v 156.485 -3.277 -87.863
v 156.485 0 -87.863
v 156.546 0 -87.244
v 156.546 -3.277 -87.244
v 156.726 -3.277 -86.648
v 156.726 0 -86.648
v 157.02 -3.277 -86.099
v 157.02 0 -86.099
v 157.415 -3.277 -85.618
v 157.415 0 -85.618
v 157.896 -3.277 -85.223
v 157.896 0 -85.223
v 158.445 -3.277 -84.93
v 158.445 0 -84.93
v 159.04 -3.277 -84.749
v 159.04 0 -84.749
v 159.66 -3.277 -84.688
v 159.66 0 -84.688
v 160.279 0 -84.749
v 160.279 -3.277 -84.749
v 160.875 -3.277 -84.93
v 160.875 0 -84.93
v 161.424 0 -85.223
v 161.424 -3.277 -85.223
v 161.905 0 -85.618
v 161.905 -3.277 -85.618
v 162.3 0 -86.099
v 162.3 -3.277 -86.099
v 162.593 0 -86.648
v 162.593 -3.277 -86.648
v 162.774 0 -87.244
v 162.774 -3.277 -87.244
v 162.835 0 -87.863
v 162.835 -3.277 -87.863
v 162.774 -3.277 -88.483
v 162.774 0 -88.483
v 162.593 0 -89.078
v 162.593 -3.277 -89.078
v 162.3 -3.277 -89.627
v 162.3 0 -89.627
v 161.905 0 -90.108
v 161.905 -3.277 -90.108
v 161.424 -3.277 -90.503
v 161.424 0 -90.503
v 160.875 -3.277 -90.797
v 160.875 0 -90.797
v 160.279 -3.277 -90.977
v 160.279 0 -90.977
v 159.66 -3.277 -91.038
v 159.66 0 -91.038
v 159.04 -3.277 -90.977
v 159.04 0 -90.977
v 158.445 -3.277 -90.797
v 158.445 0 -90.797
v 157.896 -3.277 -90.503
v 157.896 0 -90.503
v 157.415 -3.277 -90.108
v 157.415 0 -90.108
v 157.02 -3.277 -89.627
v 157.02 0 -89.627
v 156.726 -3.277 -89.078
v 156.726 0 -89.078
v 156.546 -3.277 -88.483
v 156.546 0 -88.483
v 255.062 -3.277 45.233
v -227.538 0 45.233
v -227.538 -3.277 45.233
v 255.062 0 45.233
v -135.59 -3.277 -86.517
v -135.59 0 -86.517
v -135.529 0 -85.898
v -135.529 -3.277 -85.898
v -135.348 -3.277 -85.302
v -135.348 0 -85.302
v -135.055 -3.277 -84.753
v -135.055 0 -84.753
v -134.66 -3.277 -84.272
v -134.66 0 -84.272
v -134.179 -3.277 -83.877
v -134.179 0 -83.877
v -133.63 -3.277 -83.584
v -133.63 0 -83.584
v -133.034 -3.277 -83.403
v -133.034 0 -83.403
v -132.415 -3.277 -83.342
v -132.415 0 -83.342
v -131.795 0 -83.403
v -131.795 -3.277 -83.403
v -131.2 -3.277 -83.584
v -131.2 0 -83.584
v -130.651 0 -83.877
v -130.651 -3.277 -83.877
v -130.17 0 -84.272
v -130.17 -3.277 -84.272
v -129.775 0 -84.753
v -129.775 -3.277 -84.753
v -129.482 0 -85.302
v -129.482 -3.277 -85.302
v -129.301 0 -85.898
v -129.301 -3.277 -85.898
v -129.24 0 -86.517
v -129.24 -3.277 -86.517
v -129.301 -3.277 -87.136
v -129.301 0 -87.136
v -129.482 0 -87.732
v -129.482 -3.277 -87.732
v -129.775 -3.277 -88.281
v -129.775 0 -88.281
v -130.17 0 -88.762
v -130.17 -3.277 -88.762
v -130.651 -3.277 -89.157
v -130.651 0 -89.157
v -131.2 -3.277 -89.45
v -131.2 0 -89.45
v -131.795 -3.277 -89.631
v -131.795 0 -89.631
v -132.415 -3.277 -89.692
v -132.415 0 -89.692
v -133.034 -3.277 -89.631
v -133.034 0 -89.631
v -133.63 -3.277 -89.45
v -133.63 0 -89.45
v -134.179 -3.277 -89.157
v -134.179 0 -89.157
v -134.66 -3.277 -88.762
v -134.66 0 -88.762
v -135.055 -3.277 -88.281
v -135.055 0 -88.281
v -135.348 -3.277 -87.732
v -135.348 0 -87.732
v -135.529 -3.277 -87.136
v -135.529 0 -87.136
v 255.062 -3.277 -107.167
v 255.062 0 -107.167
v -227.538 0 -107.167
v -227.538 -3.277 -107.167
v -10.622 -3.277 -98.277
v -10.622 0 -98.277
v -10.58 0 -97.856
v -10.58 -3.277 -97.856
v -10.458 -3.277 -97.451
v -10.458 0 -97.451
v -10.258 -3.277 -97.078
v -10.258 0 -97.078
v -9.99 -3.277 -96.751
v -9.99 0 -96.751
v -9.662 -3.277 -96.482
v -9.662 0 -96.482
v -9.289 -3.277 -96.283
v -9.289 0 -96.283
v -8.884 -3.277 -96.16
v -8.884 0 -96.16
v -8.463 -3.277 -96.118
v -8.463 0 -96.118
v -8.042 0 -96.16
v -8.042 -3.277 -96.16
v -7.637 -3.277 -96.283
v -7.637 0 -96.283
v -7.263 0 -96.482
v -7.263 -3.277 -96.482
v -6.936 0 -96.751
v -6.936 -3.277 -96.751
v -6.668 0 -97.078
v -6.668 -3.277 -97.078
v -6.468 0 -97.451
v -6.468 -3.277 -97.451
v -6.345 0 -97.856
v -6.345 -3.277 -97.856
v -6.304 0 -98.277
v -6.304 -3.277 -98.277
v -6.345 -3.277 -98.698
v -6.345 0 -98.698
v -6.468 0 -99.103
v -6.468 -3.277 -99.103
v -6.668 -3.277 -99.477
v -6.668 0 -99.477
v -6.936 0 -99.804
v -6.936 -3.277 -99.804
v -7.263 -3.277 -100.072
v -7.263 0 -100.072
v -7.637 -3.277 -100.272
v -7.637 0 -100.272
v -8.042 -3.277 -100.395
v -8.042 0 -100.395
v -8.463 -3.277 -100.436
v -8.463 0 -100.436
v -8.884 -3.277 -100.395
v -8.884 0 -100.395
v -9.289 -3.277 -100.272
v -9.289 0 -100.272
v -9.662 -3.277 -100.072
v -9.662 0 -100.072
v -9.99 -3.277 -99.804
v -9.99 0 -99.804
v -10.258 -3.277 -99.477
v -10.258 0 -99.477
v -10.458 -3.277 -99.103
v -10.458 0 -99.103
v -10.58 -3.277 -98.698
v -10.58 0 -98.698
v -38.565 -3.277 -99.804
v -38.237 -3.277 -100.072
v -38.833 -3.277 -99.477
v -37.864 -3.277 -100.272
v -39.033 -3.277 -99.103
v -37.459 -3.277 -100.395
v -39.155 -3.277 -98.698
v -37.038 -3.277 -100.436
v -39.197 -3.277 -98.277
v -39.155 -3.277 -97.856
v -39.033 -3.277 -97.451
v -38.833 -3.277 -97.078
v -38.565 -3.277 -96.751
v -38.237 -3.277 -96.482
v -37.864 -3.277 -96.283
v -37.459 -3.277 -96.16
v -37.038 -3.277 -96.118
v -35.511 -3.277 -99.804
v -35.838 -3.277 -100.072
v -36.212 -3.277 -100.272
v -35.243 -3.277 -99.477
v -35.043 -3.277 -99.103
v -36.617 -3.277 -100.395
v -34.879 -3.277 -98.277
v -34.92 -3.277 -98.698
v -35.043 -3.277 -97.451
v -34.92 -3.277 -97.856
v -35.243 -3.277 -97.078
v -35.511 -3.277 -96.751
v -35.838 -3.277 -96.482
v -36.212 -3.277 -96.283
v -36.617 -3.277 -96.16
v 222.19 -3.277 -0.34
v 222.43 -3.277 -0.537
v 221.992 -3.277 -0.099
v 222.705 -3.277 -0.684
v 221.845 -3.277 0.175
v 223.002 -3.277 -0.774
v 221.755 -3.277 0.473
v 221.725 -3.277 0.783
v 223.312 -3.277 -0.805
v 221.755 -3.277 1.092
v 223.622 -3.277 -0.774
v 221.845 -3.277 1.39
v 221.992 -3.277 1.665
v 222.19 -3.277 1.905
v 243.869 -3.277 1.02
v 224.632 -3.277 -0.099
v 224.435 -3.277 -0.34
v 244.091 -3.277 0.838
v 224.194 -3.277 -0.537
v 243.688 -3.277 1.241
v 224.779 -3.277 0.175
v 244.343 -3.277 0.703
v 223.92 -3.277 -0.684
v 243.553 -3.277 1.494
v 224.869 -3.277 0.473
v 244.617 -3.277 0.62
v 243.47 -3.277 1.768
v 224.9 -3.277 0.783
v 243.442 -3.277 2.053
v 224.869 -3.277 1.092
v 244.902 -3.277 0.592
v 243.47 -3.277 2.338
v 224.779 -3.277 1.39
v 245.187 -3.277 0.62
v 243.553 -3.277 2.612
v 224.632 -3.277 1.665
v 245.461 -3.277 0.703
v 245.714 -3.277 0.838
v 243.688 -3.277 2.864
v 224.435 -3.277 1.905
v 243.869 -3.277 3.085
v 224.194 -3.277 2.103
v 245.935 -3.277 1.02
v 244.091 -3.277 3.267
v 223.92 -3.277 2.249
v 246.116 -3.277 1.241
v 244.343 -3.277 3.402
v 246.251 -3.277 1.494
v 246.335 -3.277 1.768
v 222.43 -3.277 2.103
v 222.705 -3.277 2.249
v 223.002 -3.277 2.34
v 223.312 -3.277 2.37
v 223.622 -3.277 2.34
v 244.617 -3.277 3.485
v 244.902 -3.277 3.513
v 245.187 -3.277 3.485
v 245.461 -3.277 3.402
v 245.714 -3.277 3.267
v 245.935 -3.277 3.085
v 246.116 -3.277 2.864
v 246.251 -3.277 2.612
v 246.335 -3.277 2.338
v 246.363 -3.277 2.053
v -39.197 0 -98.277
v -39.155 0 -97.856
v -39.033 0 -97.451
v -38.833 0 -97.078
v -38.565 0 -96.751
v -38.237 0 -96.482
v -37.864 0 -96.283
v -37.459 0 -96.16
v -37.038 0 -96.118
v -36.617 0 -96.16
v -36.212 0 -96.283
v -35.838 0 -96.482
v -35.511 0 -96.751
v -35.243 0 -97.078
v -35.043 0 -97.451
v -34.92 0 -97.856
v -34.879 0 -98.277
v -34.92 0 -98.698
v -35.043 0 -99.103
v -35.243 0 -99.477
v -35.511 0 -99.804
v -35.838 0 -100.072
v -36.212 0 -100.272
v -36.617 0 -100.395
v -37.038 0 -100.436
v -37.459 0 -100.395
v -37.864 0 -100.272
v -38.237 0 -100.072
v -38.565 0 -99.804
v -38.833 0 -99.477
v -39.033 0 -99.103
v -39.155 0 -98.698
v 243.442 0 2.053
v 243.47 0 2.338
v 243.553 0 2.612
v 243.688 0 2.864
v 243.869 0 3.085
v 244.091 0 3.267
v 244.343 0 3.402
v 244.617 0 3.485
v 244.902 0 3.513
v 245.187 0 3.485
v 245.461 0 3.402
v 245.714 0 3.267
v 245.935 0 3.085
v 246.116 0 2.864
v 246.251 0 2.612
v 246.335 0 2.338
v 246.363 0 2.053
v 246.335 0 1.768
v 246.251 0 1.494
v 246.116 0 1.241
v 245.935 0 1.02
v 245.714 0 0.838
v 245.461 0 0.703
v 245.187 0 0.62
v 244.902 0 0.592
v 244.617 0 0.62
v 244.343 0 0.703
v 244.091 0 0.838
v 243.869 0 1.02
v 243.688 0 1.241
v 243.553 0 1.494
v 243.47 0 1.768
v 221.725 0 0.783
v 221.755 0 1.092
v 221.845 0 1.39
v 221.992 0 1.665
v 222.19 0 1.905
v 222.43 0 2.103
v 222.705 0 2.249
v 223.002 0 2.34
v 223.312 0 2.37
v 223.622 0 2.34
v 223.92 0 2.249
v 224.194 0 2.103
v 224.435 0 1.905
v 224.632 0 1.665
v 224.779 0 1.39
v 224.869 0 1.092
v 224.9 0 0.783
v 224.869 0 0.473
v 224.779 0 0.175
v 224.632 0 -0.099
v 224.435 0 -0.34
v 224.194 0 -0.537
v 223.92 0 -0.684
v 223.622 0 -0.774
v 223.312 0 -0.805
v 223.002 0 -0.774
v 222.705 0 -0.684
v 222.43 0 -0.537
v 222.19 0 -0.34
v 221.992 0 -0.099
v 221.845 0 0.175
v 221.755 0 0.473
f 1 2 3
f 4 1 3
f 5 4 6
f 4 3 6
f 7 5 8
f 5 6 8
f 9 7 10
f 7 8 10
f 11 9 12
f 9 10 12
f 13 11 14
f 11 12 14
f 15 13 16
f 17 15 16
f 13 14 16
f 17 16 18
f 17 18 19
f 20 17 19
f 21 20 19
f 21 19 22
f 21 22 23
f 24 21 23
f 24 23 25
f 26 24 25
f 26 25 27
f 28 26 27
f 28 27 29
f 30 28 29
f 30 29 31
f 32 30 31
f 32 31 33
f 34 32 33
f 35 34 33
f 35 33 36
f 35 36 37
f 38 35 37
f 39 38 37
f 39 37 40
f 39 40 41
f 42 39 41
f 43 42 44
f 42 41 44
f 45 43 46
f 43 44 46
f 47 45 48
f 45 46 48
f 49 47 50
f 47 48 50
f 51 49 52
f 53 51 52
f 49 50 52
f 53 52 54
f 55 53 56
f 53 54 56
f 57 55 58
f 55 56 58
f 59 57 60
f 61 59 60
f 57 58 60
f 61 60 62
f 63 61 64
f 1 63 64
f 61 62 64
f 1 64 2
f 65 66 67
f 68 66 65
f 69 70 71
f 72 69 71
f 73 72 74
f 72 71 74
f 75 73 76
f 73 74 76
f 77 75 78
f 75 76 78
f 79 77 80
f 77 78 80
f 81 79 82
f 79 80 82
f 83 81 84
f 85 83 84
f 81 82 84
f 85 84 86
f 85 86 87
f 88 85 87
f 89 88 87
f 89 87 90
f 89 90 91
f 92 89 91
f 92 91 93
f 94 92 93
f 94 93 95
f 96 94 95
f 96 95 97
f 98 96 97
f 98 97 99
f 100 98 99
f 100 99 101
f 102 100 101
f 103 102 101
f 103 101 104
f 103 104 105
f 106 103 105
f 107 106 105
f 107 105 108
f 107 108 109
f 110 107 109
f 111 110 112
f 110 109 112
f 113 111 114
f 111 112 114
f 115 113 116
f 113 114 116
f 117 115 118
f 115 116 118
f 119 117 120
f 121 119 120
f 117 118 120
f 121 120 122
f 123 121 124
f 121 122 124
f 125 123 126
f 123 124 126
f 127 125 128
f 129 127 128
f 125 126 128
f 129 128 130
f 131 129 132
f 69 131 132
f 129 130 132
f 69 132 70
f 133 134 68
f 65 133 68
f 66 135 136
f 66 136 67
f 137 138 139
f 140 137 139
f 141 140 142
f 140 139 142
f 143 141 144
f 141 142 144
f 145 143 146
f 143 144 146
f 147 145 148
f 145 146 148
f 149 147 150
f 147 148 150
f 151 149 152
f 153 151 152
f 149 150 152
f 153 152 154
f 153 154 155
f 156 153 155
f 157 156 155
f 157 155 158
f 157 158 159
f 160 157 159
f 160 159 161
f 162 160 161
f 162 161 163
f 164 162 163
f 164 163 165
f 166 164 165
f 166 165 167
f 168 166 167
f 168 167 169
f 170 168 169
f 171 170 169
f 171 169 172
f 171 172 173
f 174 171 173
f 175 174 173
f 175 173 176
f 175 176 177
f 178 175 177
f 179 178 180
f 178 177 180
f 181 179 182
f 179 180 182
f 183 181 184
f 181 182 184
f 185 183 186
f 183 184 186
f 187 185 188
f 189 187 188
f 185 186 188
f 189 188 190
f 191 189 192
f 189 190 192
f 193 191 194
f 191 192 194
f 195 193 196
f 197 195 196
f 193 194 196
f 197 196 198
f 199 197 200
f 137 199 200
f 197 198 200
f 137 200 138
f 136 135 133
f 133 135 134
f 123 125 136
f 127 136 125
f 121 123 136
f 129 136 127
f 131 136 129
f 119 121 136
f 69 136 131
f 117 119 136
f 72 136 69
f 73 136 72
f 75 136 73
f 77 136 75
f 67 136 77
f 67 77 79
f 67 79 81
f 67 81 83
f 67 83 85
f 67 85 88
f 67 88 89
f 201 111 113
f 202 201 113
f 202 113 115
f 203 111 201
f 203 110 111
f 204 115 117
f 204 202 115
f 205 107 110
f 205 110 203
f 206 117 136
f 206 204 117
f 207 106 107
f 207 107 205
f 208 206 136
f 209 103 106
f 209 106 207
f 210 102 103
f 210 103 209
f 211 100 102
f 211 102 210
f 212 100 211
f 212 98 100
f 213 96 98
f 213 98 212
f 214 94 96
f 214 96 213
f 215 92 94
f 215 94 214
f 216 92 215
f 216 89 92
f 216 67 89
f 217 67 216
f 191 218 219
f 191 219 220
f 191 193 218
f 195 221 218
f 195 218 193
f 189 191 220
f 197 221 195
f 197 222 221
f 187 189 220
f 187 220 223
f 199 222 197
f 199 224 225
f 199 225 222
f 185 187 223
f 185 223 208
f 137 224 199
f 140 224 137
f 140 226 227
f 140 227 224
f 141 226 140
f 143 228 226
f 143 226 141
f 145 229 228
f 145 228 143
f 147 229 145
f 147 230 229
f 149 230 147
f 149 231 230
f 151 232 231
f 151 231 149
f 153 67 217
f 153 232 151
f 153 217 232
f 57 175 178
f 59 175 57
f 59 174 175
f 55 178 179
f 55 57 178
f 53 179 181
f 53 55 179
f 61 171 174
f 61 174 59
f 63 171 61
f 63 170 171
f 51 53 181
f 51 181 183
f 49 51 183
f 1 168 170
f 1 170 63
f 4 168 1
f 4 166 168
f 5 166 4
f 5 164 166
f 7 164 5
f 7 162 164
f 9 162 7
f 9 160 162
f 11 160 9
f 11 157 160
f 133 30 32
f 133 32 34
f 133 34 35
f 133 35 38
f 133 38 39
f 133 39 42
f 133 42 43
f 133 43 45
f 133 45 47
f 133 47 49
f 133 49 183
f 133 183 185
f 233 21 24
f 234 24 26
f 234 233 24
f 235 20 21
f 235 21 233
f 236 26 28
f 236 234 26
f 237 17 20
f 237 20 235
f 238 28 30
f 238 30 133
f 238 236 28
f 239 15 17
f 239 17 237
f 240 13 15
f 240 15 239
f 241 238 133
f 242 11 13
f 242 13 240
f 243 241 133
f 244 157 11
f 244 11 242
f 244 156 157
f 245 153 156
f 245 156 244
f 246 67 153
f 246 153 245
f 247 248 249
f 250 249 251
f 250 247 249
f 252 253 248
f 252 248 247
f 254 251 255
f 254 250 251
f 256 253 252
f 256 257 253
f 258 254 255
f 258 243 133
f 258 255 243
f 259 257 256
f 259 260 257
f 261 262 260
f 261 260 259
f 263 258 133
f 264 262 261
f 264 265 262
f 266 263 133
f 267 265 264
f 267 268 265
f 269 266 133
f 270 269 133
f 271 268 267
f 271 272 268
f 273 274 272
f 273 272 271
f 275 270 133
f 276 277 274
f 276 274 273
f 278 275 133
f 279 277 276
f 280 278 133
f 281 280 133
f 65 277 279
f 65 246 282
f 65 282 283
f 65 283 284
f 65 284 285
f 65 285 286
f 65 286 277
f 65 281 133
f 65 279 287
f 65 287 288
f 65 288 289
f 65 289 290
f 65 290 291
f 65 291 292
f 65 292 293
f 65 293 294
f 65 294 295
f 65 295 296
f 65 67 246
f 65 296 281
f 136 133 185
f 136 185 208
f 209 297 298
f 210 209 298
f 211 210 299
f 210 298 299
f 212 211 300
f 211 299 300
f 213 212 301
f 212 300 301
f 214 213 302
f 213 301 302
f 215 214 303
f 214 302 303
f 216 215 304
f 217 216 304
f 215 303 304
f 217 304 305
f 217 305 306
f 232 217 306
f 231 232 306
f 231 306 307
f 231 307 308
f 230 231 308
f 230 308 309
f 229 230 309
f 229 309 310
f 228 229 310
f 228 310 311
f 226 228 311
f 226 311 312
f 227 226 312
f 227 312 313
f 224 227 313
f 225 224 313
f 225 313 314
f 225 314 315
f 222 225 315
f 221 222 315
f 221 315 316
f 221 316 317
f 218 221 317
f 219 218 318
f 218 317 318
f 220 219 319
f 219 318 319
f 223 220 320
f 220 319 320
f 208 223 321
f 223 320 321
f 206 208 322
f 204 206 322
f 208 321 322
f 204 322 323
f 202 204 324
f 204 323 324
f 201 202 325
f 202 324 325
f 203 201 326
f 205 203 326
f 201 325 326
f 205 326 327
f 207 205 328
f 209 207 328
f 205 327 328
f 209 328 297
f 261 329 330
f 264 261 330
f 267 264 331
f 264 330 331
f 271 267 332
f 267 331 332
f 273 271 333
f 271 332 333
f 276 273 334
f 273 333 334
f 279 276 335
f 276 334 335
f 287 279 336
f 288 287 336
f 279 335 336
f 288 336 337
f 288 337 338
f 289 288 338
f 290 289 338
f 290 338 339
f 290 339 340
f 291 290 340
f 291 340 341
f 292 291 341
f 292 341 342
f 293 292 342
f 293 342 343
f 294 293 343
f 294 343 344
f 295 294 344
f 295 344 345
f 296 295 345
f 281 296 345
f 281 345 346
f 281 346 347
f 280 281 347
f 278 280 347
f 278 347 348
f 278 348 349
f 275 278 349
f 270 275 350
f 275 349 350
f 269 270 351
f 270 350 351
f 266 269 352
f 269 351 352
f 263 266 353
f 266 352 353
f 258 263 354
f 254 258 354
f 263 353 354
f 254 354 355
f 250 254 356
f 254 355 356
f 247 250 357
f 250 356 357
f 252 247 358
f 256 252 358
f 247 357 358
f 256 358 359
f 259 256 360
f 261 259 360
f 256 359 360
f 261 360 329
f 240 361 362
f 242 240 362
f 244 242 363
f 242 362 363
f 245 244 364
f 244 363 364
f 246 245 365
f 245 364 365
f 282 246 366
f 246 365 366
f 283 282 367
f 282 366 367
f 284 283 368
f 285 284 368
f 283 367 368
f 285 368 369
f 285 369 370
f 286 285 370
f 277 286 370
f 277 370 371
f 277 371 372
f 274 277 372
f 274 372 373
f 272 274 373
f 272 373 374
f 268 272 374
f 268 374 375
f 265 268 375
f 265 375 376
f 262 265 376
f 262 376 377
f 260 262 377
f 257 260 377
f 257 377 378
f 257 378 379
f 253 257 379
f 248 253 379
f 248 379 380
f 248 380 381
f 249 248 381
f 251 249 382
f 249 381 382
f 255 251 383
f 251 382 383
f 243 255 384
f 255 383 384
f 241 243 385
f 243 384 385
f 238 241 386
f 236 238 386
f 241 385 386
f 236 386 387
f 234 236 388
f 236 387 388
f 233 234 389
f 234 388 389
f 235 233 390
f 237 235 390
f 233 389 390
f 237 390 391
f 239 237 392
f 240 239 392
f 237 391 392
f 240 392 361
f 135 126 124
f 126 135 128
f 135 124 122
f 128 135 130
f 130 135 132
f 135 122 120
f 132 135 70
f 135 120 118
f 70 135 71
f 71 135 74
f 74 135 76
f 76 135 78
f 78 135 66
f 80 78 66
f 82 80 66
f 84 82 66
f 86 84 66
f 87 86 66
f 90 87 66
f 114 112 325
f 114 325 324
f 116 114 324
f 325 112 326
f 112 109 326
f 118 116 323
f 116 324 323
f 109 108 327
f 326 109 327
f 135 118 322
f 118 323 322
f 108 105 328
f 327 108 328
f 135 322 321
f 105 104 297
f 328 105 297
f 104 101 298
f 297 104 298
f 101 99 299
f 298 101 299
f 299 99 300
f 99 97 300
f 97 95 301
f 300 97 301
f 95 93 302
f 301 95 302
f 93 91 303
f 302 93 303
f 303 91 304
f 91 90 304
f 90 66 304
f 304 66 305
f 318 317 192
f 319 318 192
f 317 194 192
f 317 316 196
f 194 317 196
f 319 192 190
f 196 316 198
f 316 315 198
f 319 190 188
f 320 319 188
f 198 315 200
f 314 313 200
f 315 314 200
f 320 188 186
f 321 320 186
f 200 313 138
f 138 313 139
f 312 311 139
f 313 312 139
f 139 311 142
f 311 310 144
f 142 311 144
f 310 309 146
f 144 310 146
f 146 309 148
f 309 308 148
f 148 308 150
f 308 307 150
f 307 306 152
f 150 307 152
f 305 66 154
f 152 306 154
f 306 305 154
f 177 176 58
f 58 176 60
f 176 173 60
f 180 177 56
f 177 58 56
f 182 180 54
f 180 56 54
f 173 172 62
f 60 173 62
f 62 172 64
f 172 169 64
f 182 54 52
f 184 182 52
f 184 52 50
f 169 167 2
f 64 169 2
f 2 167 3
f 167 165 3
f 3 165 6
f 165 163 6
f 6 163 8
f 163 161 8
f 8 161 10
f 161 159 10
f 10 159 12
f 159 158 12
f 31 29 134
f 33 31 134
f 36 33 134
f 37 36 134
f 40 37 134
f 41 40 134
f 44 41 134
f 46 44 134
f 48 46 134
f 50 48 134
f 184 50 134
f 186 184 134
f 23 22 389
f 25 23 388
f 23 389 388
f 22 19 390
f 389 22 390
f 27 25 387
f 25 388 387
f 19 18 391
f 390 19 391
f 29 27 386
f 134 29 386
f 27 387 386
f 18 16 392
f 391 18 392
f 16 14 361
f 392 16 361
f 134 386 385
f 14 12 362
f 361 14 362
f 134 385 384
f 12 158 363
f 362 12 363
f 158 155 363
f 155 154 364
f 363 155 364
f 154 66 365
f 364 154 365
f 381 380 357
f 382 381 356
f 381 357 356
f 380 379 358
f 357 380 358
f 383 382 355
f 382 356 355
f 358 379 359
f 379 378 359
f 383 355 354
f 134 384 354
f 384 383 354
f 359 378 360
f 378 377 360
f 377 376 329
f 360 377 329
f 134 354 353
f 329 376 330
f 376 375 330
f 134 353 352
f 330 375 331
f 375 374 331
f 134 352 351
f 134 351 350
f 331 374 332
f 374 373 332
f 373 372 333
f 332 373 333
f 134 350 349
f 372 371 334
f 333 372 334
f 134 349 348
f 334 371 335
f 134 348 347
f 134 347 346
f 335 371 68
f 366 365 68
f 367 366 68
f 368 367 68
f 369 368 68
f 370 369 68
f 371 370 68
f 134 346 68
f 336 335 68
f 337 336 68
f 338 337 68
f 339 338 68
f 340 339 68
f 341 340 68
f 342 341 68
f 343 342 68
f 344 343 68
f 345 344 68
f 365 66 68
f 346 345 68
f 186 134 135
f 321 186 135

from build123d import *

# Parameters (mm, degrees)
F0_W     = 482.6
F0_H     = 152.4
F1_DEPTH = 3.2766
F4_D     = 3.175
F6_D     = 4.318
F8_D     = 4.318
F10_D    = 2.921
F11_D    = 6.35


with BuildPart() as f1:
    # F0 (on Front) → F1 (new body)
    with BuildSketch(Plane.XZ):
        with Locations((13.762098, -30.967272)):
            Rectangle(F0_W, F0_H)
    extrude(amount=F1_DEPTH)

    # F4 (through all)
    with Locations(Plane.XZ.offset(3.2766)):
        with Locations((223.312098, 0.782728)):
            Hole(F4_D / 2)

    # F6 (through all)
    with Locations(Plane.XZ.offset(3.2766)):
        with Locations((-8.462902, -98.277272)):
            Hole(F6_D / 2)

    # F8 (through all)
    with Locations(Plane.XZ.offset(3.2766)):
        with Locations((-37.037902, -98.277272)):
            Hole(F8_D / 2)

    # F10 (through all)
    with Locations(Plane.XZ.offset(3.2766)):
        with Locations((244.902098, 2.052728)):
            Hole(F10_D / 2)

    # F11 (through all)
    with Locations(Plane.XZ.offset(3.2766)):
        with Locations((-132.414902, -86.517072), (159.659698, -87.863272)):
            Hole(F11_D / 2)


solid = f1.part
